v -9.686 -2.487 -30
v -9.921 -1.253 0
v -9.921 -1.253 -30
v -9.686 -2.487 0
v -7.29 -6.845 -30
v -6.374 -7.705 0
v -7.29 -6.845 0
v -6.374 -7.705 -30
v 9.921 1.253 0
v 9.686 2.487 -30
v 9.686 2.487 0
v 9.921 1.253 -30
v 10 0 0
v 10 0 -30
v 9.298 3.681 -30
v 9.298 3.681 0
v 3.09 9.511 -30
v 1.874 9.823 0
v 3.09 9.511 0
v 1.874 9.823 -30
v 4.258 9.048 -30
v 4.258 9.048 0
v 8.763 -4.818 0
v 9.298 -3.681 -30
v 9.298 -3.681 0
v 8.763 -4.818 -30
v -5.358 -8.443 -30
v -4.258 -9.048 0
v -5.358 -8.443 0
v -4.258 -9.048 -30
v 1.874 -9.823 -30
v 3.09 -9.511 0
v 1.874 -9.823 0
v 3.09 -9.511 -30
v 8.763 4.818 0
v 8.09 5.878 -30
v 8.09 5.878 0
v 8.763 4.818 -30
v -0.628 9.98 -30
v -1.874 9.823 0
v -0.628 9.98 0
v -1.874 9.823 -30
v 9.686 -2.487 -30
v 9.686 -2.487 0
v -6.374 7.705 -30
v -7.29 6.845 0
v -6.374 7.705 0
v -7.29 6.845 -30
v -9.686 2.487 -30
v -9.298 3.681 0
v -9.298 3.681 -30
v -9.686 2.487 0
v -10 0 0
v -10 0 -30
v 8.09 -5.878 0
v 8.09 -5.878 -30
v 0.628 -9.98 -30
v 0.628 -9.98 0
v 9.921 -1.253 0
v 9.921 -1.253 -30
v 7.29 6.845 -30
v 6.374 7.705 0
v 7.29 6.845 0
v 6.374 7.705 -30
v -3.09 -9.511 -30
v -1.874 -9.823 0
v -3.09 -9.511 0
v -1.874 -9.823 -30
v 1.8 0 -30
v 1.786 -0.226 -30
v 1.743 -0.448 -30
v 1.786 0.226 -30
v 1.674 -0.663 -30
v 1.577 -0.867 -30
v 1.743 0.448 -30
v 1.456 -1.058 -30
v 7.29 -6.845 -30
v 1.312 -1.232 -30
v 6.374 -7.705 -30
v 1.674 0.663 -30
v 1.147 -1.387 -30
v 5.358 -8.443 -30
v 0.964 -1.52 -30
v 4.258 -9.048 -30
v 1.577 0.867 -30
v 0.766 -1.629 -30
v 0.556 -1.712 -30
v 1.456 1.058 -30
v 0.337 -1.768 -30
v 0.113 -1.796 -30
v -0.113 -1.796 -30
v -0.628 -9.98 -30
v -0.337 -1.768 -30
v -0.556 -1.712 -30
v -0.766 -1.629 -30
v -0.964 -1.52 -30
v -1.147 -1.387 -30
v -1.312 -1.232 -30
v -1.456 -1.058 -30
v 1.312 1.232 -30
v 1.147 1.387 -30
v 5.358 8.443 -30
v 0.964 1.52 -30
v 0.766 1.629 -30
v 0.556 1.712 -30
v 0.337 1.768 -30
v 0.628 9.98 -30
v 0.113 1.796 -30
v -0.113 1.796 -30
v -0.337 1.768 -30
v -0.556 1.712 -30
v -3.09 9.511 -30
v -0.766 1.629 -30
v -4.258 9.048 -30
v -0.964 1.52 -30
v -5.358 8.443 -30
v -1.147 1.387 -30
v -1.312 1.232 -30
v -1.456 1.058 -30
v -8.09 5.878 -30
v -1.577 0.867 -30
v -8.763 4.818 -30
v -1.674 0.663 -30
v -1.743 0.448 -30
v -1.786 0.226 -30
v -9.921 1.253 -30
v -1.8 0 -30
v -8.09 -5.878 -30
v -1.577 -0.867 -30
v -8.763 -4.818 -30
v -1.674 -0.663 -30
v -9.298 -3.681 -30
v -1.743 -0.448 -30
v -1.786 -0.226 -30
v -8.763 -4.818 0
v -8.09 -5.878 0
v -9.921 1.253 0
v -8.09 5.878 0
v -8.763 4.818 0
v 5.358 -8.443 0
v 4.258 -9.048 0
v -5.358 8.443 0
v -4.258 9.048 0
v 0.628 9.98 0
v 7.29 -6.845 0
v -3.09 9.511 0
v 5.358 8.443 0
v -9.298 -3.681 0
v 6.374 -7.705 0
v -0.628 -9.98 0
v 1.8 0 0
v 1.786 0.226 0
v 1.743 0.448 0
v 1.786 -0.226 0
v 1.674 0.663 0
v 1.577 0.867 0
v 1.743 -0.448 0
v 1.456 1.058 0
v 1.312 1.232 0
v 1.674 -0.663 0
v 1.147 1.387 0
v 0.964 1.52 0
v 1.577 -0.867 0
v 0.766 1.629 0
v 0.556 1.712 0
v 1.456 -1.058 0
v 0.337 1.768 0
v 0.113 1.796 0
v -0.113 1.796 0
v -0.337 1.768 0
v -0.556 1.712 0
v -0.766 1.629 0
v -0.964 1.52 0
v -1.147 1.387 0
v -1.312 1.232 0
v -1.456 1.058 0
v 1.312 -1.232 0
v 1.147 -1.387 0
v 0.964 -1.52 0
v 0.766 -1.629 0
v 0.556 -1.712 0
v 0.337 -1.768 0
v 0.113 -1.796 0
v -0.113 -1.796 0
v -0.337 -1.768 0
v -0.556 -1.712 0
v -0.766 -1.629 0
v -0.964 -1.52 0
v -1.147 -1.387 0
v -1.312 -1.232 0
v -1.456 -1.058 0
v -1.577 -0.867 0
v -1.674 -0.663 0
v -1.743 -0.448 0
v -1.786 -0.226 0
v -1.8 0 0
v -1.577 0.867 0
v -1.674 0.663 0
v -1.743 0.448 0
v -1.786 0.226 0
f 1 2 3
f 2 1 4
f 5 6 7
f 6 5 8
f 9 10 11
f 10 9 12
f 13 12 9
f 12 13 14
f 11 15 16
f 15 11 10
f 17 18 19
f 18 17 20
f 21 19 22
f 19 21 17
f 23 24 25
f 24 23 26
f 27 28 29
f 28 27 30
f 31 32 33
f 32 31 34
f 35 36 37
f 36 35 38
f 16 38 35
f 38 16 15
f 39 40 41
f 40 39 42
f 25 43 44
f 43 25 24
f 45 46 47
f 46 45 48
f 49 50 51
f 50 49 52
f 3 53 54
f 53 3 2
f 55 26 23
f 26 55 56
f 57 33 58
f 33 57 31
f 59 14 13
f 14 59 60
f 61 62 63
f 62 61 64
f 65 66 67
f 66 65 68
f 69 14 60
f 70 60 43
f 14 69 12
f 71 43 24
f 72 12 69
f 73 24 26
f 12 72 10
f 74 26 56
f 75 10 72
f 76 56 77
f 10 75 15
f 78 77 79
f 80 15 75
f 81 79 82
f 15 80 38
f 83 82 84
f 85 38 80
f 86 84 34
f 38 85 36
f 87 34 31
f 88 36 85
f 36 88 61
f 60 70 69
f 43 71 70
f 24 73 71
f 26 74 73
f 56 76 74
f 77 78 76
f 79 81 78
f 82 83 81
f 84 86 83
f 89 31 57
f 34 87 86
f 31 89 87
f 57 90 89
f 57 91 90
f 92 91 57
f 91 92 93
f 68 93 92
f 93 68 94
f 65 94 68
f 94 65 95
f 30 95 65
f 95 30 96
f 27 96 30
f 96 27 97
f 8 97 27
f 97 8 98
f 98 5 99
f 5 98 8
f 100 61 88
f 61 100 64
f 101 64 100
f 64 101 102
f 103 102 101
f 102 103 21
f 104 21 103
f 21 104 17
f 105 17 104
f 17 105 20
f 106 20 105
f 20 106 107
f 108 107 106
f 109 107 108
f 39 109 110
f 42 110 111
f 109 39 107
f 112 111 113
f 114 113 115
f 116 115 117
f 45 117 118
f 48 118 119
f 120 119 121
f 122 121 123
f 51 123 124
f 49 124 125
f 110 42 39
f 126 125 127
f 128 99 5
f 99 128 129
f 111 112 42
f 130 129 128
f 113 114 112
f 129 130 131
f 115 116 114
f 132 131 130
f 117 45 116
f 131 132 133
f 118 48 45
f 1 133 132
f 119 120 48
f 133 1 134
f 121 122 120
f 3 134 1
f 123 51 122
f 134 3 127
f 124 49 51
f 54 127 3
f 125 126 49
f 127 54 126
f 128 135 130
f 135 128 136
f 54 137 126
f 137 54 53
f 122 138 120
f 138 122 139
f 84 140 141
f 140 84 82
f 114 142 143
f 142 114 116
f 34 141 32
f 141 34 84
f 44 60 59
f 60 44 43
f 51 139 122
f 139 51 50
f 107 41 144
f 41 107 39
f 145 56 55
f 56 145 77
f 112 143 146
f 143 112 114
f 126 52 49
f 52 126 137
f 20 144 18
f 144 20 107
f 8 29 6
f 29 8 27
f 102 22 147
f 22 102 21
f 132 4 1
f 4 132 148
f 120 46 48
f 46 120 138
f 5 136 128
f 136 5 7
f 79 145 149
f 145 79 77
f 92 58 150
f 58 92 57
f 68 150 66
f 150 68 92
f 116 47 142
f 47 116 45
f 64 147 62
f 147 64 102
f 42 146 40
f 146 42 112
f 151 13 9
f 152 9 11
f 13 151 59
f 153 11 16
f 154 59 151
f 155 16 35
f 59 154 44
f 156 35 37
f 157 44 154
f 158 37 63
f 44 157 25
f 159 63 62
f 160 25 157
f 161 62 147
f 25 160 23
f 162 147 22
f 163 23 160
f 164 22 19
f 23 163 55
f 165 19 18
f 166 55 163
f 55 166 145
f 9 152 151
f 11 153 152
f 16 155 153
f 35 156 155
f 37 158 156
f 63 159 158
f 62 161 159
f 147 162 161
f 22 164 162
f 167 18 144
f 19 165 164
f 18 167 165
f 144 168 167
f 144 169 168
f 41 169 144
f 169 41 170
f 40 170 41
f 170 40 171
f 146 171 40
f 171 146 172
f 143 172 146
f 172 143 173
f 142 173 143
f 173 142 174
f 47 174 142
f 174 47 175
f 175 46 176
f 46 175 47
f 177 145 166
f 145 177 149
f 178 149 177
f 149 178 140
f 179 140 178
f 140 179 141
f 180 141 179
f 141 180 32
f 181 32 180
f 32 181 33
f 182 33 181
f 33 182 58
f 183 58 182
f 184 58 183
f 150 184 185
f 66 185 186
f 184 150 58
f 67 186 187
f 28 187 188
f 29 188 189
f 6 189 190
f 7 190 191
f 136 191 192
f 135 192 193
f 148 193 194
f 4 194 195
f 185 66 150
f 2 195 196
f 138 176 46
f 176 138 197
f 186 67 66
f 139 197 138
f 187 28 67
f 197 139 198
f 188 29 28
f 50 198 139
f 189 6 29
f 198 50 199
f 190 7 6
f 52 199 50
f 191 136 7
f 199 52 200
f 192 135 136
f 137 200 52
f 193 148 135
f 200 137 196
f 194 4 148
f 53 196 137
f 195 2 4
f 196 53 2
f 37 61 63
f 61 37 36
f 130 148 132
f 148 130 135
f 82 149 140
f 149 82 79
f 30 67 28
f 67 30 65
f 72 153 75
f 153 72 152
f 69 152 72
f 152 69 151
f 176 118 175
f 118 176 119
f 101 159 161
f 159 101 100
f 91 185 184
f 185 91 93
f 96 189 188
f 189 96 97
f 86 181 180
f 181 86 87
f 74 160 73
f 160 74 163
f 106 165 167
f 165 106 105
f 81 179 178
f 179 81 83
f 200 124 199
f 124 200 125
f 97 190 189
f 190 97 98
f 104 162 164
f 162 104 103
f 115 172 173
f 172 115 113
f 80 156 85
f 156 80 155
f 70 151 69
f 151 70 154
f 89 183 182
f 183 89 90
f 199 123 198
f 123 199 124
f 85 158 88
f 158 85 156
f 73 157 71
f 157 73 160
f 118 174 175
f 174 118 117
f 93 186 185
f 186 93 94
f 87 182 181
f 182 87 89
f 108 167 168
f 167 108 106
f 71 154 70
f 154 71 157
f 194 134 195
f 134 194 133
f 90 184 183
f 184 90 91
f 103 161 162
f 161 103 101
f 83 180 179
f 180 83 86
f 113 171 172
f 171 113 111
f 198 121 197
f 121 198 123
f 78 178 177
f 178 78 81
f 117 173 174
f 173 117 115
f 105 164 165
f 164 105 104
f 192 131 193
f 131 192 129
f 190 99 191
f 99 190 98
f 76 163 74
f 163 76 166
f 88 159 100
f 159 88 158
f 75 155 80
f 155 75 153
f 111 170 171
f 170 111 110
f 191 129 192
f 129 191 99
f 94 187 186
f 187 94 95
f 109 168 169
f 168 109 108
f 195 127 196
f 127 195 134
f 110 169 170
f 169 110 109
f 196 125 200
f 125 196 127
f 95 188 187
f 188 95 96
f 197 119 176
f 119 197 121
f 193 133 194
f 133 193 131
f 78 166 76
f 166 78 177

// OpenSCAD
$fn = 50;


difference() {
	union() {
		translate(v = [0, 0, -30.0000000000]) {
			cylinder(h = 30, r = 10.0000000000);
		}
		cylinder(h = 0, r = 13.0000000000);
	}
	union() {
		#translate(v = [0, 0, -30]) {
			cylinder(h = 30, r = 1.8000000000);
		}
	}
}
